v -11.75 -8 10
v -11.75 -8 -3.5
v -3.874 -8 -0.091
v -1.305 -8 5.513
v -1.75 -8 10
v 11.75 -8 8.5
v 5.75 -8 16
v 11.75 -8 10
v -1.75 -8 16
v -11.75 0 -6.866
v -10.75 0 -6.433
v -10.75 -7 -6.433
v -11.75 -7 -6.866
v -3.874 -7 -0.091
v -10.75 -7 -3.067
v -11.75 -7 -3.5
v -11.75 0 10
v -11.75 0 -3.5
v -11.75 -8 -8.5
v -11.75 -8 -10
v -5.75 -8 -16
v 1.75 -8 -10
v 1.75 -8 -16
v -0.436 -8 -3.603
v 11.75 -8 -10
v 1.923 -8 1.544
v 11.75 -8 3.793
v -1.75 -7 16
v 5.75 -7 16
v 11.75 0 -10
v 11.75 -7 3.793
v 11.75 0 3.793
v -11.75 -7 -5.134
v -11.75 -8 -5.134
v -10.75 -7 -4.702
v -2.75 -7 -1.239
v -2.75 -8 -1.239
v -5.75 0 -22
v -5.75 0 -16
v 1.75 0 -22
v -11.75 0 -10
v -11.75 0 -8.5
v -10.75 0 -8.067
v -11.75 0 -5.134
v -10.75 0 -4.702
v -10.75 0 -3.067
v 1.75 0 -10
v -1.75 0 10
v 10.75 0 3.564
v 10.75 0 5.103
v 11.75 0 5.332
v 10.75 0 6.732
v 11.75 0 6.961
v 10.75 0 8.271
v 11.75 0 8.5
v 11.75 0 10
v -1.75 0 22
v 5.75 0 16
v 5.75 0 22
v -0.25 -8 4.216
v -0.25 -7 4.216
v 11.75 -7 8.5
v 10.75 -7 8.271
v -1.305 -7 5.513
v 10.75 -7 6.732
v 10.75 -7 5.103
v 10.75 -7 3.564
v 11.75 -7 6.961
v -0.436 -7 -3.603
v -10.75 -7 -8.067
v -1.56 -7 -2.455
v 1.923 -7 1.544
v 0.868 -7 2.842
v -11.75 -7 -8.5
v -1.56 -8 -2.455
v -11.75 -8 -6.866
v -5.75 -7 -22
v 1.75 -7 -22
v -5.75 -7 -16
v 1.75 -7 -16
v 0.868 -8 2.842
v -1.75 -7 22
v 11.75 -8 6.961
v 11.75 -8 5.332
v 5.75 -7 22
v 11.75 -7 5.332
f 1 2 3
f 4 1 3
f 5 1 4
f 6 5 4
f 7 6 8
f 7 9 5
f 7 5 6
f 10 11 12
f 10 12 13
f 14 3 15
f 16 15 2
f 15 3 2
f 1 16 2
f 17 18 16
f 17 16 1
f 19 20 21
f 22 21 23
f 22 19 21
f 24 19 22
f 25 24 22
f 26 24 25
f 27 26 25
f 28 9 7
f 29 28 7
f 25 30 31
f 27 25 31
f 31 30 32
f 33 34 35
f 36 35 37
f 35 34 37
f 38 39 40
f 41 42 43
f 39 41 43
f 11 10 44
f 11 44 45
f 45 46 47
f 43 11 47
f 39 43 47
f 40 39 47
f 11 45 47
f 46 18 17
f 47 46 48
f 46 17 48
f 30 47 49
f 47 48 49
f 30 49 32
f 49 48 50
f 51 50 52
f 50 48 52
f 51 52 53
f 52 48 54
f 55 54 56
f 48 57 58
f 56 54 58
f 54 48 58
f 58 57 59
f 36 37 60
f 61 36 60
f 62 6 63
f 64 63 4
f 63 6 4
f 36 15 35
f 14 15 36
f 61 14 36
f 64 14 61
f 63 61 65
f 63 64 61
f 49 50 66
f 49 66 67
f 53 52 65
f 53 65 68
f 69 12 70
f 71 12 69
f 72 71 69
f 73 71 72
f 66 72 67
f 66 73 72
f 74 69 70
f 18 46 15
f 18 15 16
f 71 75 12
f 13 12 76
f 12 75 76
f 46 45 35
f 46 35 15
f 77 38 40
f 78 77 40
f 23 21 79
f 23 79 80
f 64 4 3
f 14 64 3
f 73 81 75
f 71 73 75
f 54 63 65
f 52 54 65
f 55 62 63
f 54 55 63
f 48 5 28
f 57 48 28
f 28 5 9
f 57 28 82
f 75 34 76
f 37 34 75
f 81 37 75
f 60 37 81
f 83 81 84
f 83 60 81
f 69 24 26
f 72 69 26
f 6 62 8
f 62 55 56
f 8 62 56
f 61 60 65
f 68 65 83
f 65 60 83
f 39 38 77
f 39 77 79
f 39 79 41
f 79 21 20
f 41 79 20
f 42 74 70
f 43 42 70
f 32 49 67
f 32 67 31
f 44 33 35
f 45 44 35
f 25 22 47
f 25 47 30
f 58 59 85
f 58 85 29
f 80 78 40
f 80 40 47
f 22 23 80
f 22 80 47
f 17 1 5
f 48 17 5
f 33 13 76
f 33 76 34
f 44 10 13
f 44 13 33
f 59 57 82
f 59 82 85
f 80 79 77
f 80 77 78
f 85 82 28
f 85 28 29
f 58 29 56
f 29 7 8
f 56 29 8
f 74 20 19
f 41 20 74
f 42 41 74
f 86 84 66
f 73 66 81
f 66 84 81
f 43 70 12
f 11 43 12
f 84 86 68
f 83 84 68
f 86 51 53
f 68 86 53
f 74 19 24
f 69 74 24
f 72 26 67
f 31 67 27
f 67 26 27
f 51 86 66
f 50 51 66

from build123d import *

# Parameters (mm, degrees)
F0_W     = 23.5
F0_H     = 44
F1_DEPTH = 8
F2_W     = 10
F2_H     = 12
F3_DEPTH = 8
F4_W     = 7.5
F4_H     = 6
F5_DEPTH = 1
F7_DEPTH = 7


with BuildPart() as f1:
    # F0 (on Front) → F1 (new body)
    with BuildSketch(Plane.XZ):
        Rectangle(F0_W, F0_H)
    extrude(amount=F1_DEPTH)

    # F2 (on face) → F3 (cut, through all)
    with BuildSketch(Plane.XZ.offset(8)):
        with Locations((-6.75, 16)):
            Rectangle(F2_W, F2_H)
        with Locations((6.75, -16)):
            Rectangle(F2_W, F2_H)
        Polygon((11.75, 16), (11.75, 22), (5.75, 22), (5.75, 16), (11.75, 10), align=None)
        Polygon((-11.75, -16), (-11.75, -22), (-5.75, -22), (-5.75, -16), (-11.75, -10), align=None)
    extrude(amount=-F3_DEPTH, mode=Mode.SUBTRACT)

    # F4 (on face) → F5 (cut)
    with BuildSketch(Plane.XZ.offset(8)):
        Polygon((-0.25, 4.21563), (11.75, 6.961239), (11.75, 8.5), (-1.305453, 5.512903), (-3.873864, -0.090707), (-11.75, -3.5), (-11.75, -5.134498), (-2.75, -1.238726), align=None)
        Polygon((0.86777, 2.841763), (-1.55978, -2.454526), (-11.75, -6.865502), (-11.75, -8.5), (-0.435916, -3.602545), (1.923223, 1.54449), (11.75, 3.792863), (11.75, 5.331624), align=None)
        with Locations((2, 19)):
            Rectangle(F4_W, F4_H)
        with Locations((-2, -19)):
            Rectangle(F4_W, F4_H)
    extrude(amount=-F5_DEPTH, mode=Mode.SUBTRACT)

    # F6 (on face) → F7 (cut, through all)
    with BuildSketch(Plane.XZ.offset(7)):
        Polygon((11.75, 6.961239), (11.75, 8.5), (10.75, 8.271199), (10.75, 6.732438), align=None)
        Polygon((11.75, 3.792863), (11.75, 5.331624), (10.75, 5.102824), (10.75, 3.564062), align=None)
        Polygon((-11.75, -3.5), (-11.75, -5.134498), (-10.75, -4.701635), (-10.75, -3.067136), align=None)
        Polygon((-11.75, -6.865502), (-11.75, -8.5), (-10.75, -8.067136), (-10.75, -6.432638), align=None)
    extrude(amount=-F7_DEPTH, mode=Mode.SUBTRACT)


solid = f1.part
